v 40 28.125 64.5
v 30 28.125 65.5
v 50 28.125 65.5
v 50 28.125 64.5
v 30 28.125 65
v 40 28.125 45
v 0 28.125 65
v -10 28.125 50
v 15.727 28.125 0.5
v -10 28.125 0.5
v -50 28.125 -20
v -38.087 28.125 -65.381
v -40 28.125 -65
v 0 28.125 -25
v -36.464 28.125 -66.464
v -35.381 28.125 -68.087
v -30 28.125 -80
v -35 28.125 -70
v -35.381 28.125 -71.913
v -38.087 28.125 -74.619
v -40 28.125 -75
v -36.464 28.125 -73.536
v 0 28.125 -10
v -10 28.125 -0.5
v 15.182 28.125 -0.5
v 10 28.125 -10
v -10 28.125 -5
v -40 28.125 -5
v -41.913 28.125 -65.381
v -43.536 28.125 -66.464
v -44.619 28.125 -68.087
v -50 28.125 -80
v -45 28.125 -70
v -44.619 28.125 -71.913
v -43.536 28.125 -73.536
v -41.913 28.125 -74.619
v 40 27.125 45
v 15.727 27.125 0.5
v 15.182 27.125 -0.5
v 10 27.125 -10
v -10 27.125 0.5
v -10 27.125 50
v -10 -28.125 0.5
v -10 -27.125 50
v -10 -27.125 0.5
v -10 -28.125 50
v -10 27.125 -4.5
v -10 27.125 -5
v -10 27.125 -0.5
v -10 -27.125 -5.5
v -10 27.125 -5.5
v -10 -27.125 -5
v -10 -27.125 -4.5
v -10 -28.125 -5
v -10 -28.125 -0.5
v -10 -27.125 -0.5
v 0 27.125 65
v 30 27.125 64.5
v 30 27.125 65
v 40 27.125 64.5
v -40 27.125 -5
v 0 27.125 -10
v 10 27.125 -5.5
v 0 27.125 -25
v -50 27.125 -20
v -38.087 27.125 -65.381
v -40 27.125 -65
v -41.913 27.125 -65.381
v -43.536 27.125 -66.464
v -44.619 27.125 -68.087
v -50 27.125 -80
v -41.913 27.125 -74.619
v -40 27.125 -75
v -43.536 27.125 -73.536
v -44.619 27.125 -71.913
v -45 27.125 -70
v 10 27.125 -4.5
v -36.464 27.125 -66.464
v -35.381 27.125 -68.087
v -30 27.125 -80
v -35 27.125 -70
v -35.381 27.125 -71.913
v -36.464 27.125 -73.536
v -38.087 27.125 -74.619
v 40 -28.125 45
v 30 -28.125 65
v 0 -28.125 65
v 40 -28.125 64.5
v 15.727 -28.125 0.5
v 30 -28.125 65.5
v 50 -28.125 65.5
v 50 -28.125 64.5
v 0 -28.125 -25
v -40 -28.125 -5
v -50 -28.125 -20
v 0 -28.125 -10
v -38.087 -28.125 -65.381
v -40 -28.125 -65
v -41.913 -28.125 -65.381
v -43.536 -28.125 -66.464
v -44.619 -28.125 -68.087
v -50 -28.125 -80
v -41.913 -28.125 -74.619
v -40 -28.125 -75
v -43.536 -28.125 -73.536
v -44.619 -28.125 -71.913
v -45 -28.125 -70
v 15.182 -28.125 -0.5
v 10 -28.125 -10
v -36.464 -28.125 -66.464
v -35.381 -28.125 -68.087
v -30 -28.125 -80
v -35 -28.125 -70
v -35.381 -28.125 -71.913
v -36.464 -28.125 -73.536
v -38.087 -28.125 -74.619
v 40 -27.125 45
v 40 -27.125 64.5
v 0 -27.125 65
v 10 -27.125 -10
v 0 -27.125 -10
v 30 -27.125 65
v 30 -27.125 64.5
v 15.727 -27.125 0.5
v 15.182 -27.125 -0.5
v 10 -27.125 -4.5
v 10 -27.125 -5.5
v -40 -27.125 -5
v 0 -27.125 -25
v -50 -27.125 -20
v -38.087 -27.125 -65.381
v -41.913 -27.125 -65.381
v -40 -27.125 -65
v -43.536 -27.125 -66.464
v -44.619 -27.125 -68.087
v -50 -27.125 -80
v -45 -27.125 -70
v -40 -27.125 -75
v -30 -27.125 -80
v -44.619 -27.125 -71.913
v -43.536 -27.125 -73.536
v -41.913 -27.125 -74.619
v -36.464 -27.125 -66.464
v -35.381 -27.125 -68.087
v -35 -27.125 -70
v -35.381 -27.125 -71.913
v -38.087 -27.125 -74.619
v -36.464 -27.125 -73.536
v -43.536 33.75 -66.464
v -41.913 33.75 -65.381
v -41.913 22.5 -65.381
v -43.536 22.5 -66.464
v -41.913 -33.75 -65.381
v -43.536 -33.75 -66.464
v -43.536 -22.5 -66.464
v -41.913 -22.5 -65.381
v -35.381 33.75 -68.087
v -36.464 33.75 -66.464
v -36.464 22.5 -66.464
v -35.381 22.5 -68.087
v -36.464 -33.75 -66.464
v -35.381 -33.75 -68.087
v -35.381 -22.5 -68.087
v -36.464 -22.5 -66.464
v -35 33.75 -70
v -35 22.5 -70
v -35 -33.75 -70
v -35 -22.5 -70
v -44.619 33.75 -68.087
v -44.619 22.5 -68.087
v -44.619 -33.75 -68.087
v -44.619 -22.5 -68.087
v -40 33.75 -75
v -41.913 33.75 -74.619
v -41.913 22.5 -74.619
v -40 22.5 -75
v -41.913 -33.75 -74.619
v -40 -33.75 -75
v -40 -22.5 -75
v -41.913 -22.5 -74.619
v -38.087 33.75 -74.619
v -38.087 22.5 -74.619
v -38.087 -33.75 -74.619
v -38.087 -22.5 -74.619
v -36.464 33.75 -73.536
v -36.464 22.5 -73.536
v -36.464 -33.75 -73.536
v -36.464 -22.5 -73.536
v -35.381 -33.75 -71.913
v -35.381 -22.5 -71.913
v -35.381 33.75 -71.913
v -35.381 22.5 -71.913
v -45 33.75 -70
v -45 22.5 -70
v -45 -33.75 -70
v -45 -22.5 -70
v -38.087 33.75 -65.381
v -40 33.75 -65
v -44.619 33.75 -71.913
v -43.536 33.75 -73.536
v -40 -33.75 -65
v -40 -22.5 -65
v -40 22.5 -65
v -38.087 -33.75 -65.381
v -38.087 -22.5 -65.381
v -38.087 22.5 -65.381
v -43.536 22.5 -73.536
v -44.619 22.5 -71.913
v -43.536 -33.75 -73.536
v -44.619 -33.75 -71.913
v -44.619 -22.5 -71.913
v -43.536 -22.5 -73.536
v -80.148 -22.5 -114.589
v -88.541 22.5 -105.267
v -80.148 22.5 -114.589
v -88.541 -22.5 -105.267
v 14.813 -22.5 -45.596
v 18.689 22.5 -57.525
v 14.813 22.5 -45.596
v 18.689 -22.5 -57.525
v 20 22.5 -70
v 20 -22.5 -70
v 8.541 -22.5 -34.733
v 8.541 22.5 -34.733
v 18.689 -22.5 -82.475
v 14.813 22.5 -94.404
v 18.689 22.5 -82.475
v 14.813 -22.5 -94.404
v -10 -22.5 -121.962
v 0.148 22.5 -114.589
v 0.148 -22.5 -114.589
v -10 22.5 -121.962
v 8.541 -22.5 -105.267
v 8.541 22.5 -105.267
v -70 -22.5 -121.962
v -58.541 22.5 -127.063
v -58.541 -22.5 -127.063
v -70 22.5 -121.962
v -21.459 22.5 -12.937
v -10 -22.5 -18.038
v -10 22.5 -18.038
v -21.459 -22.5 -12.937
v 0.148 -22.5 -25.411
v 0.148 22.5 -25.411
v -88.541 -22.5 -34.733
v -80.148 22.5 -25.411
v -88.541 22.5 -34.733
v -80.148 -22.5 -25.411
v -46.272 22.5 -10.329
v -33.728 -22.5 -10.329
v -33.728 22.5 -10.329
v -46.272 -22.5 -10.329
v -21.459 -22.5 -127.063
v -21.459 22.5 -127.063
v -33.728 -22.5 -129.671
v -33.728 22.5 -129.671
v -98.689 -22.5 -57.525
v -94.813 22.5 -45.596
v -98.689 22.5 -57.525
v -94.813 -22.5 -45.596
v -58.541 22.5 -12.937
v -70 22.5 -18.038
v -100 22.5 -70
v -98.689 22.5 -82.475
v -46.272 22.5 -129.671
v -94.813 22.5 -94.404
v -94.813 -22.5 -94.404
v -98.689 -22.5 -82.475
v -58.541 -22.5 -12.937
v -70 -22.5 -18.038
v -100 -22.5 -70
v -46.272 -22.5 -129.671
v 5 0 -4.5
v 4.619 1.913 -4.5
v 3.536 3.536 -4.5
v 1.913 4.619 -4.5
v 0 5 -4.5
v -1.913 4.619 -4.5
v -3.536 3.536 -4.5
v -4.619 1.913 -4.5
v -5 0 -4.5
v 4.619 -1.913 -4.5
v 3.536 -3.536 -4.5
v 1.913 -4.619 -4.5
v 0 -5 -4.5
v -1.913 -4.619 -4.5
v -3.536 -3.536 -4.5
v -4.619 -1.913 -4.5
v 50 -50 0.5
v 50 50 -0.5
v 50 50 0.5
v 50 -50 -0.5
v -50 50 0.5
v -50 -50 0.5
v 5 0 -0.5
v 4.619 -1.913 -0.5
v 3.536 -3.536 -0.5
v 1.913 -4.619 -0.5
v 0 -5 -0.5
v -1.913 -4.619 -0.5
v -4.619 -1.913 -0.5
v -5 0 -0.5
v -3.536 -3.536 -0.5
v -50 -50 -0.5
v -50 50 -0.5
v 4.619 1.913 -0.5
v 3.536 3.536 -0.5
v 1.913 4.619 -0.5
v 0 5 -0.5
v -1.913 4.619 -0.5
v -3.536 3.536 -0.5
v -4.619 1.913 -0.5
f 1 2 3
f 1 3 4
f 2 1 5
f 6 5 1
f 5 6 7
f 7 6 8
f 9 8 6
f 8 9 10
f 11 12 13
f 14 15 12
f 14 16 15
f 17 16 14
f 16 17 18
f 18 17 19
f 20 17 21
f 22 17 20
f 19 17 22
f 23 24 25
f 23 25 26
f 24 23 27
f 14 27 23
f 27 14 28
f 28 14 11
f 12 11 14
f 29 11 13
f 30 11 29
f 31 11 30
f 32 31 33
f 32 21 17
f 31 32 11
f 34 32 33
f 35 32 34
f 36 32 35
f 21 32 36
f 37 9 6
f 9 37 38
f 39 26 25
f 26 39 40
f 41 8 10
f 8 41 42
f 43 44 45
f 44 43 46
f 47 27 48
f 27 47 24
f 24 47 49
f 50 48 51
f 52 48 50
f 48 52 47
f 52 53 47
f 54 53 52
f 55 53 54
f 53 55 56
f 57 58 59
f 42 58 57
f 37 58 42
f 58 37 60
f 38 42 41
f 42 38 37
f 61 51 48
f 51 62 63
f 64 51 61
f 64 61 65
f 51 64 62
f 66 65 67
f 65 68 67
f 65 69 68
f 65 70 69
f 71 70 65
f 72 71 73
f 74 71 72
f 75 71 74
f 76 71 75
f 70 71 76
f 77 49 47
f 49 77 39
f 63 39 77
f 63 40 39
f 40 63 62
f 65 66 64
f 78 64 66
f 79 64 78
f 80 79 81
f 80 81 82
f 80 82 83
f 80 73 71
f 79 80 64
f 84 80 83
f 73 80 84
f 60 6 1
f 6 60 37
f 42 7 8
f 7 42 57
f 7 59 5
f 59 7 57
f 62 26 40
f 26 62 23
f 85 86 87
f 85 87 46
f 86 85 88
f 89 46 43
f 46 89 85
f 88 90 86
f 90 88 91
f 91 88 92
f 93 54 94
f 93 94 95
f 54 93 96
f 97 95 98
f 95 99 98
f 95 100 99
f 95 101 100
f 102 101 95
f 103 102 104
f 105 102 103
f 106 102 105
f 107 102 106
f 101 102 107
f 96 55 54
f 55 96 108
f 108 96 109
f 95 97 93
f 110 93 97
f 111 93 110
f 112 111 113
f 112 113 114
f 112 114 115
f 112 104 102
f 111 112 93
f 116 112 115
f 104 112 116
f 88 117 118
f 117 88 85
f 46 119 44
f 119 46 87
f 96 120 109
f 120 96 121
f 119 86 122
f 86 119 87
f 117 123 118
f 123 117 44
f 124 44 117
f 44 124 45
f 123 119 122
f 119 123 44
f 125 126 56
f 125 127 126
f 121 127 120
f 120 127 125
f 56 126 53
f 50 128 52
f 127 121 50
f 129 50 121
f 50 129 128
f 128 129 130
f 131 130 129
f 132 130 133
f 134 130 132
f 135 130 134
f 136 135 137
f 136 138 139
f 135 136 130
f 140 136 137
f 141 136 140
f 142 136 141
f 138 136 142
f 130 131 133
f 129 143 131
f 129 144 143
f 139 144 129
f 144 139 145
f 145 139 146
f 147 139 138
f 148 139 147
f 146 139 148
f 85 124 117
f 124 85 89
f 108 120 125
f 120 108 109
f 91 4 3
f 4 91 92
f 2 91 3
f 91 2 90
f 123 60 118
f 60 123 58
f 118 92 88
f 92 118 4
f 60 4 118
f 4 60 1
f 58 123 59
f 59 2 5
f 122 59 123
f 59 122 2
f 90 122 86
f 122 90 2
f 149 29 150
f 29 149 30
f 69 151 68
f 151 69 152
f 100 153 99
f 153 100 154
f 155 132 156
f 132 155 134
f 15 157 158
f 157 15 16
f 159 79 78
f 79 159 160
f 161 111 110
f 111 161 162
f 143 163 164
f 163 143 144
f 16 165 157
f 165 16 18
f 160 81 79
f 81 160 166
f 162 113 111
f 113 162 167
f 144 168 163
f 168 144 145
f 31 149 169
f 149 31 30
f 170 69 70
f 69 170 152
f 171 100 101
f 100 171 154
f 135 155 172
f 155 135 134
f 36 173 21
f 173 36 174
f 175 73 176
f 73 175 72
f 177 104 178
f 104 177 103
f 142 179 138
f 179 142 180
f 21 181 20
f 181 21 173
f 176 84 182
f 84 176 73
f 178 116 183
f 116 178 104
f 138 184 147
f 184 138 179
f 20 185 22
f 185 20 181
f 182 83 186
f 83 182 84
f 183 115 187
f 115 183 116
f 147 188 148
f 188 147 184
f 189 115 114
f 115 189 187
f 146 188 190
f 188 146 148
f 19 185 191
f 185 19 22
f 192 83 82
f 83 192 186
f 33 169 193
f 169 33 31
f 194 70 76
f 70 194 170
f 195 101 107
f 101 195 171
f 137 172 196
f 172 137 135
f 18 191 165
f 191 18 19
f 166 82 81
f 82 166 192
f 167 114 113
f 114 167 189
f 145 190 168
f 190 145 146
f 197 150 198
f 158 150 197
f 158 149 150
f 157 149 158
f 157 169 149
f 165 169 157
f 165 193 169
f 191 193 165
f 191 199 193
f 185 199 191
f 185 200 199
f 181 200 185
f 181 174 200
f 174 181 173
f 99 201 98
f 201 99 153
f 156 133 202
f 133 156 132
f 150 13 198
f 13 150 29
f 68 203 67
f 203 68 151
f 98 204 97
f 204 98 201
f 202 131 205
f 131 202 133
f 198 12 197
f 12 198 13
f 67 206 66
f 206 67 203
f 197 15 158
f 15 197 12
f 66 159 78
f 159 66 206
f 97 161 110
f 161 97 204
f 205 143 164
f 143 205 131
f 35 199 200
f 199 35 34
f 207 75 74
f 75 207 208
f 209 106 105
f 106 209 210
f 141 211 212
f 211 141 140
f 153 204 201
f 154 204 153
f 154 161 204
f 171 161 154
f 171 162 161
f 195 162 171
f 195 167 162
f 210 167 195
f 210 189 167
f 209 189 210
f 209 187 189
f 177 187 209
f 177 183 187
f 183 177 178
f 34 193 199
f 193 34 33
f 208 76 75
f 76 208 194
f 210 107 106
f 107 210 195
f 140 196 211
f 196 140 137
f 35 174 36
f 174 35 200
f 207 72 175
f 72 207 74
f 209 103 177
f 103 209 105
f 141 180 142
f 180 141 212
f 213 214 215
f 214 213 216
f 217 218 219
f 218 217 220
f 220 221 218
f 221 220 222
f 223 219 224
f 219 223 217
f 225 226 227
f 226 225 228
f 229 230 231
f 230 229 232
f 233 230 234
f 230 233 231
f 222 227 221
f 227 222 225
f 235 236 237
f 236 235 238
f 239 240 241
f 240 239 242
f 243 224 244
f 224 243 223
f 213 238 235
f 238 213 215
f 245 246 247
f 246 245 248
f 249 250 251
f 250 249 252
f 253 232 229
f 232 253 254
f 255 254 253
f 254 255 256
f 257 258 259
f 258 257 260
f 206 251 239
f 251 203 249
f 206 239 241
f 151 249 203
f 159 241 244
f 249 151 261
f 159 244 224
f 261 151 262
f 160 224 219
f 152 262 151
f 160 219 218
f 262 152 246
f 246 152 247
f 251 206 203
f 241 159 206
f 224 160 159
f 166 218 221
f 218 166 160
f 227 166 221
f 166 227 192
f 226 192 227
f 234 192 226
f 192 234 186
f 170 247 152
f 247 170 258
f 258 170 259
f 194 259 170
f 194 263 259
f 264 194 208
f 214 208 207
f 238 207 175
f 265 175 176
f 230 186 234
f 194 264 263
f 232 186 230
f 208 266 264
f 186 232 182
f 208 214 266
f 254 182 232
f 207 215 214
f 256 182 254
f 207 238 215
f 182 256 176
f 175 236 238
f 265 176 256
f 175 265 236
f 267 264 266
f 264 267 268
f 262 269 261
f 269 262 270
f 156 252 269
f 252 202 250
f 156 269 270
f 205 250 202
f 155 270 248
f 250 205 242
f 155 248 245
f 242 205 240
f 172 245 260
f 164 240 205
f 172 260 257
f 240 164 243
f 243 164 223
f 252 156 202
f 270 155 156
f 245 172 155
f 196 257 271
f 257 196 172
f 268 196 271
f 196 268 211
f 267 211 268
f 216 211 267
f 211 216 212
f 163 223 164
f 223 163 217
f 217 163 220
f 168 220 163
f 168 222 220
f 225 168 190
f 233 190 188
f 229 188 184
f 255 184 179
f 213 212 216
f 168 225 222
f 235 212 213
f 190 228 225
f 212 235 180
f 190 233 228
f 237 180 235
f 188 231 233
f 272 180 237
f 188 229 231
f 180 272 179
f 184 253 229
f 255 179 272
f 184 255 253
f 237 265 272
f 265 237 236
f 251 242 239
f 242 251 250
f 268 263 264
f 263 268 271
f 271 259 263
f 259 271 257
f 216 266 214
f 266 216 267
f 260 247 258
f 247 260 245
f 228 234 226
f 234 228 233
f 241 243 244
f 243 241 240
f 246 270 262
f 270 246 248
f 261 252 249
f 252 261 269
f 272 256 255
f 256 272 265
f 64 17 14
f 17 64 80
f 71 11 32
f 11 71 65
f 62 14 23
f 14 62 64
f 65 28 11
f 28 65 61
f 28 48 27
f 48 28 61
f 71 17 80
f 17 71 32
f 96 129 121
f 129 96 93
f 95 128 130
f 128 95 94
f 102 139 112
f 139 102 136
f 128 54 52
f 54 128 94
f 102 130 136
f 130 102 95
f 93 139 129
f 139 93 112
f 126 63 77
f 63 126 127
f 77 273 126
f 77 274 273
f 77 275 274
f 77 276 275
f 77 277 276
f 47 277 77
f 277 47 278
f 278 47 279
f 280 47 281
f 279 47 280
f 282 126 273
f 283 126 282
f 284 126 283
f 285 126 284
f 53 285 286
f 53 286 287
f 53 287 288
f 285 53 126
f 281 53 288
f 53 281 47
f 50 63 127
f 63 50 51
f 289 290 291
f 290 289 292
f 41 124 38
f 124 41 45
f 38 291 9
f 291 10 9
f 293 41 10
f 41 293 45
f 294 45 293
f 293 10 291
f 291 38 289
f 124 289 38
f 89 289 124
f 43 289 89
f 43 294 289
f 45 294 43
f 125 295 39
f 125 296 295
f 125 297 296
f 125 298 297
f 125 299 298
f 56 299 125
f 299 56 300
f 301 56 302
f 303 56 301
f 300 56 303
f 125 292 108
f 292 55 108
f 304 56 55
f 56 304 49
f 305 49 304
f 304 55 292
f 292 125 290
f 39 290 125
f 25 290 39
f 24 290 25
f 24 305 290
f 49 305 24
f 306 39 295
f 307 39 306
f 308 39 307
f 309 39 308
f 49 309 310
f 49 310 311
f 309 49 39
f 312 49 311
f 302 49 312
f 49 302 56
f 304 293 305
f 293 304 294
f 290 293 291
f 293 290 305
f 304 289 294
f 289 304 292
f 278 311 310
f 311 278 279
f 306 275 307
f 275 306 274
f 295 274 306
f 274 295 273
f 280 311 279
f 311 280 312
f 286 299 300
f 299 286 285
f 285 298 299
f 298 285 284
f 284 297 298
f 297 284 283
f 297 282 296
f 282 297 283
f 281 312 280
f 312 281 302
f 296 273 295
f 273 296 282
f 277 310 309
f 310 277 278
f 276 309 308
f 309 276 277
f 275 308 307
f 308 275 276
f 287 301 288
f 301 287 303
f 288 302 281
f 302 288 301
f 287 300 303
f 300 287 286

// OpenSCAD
lod=0;
wheeldiam=120;
wheelwidth=45;
castordistance=40;
platesize=100; 
totalheight=130;
wheeltheta=0;
castortheta=0;

module CastorHalfArm(){
    hull(){
        translate([0, wheelwidth/2*1.25, wheeldiam/2-5])
        rotate([90, 0, 0])
        translate([0, -10, 0])
        cube([castordistance, 20, 1], center=false);
        
        translate([0, wheelwidth/2*1.25, -10])
        rotate([90, -90, 0])
        translate([0, -10, 0])
        cube([wheeldiam/2, 20, 1], center=false);
    }
}

module CastorArm(){
    CastorHalfArm();
    mirror([0, 1, 0]){
        CastorHalfArm();
    }
    translate([castordistance, 0, wheeldiam/2+5])
    {
        cube([20, wheelwidth*1.25, 1], center=true);
    }
}
    //CastorArm();
    
if (lod==0){
    cube([platesize, platesize, 1], center=true);
    translate([0,0,-5])
    color([1,0,0])
    cylinder(5, d=10);
    rotate([0, 0, castortheta]) {

        
        translate([-castordistance, 0, -totalheight+wheeldiam/2]){
            rotate([90, 0, 0]) {
                color([1,0,0])
                cylinder(h=wheelwidth*1.5, d=10, center=true);    
                
                rotate([0, 0, wheeltheta])
                color([.3,.3,.3])
                cylinder(h=wheelwidth, d=wheeldiam, center=true);
            };
            CastorArm();
        }
    }
}


//translate([0, 0, 100])
CastorArm();
